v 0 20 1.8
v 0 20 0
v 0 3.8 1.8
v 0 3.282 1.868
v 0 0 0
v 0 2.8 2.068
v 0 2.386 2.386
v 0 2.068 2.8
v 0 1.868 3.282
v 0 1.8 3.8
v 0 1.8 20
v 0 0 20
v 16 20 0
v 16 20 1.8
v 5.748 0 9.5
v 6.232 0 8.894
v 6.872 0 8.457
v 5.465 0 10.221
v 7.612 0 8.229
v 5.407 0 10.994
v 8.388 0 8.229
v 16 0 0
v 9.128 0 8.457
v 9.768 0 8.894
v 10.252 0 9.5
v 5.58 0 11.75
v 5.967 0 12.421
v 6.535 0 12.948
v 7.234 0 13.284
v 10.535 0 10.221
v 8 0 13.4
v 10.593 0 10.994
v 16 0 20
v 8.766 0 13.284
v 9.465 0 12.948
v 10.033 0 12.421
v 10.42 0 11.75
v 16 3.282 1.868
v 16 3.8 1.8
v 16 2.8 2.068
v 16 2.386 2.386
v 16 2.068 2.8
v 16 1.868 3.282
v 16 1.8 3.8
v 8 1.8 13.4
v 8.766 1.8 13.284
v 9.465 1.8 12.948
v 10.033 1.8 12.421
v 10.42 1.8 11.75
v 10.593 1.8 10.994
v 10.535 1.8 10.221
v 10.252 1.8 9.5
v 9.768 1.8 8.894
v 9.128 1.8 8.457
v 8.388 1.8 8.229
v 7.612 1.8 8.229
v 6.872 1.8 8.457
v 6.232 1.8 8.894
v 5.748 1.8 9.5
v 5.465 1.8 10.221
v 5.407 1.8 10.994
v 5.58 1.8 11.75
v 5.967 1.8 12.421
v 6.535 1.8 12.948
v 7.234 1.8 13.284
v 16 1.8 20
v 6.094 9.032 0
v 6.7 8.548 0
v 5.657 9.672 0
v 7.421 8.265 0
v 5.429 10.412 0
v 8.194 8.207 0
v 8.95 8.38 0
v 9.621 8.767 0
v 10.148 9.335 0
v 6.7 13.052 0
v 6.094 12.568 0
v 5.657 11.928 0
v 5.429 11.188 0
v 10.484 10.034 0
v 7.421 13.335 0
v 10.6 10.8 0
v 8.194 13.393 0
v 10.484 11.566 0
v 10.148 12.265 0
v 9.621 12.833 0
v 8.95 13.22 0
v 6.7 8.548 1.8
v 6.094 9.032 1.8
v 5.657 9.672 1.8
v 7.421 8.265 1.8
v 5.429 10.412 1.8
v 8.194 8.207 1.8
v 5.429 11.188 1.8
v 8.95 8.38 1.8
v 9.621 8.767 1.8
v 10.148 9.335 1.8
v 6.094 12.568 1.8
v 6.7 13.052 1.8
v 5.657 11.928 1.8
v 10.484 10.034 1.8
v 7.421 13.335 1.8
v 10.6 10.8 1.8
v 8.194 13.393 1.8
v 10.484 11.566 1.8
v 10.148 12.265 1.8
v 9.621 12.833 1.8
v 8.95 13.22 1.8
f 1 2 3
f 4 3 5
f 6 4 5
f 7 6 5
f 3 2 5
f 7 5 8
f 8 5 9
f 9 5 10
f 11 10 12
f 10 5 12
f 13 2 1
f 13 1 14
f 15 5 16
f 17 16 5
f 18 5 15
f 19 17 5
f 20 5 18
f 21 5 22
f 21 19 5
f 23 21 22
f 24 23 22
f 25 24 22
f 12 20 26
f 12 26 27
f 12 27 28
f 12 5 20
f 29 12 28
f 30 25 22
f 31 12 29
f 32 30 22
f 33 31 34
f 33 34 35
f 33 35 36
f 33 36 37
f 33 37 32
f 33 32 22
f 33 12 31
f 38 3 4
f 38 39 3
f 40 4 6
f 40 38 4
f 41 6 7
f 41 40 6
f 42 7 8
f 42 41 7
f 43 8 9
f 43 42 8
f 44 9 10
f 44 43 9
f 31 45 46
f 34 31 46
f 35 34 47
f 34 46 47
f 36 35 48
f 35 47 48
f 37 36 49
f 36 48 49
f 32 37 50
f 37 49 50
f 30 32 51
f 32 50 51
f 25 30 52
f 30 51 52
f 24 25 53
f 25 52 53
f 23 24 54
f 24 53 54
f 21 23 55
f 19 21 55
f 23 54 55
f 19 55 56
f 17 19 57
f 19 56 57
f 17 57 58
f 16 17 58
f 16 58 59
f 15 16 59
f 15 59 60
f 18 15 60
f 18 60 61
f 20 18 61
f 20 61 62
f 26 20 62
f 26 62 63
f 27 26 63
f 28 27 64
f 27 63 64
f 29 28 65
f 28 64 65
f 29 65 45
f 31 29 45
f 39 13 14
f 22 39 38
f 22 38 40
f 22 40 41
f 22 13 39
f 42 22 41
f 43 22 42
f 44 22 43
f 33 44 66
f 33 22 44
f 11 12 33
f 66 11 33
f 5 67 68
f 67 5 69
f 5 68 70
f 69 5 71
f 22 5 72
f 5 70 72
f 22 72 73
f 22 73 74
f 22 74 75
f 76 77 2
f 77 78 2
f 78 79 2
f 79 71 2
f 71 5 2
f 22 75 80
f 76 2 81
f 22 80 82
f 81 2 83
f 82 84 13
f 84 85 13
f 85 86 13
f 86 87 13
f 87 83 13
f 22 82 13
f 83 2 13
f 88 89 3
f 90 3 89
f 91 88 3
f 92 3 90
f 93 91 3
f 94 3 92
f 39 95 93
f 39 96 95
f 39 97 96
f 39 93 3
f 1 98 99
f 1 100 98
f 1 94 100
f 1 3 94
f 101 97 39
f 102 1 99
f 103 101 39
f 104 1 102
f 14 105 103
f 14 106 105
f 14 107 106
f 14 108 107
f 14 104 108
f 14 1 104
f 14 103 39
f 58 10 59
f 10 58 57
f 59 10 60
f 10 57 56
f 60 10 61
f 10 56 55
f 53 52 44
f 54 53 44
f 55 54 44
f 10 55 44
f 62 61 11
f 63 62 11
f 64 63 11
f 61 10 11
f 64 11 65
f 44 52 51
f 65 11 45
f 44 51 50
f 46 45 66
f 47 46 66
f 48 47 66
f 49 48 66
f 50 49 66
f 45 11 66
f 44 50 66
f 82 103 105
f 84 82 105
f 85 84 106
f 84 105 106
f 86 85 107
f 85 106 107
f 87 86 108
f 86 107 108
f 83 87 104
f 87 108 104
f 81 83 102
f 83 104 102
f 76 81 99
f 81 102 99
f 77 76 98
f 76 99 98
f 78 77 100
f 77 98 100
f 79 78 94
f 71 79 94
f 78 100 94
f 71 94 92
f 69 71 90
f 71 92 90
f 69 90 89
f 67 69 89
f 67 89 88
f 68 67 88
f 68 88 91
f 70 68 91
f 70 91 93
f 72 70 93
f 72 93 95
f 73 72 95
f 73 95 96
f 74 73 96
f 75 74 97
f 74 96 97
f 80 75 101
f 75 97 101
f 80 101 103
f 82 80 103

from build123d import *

# Parameters (mm, degrees)
SKETCH1_W           = 16
SKETCH1_H           = 20
BOSS_EXTRUDE1_DEPTH = 1.8
SKETCH2_W           = 16
SKETCH2_H           = 18.2
BOSS_EXTRUDE2_DEPTH = 1.8
SKETCH3_R           = 2.6
CUT_EXTRUDE1_DEPTH  = 1.8
SKETCH4_R           = 2.6
CUT_EXTRUDE2_DEPTH  = 1.8
FILLET1_R           = 2


with BuildPart() as part:
    # Sketch1 → Boss-Extrude1 (new body)
    with BuildSketch(Plane.XY):
        with Locations((8, 10)):
            Rectangle(SKETCH1_W, SKETCH1_H)
    extrude(amount=BOSS_EXTRUDE1_DEPTH)

    # Sketch2 → Boss-Extrude2 (add)
    with BuildSketch(Plane.XZ):
        with Locations((8, 10.9)):
            Rectangle(SKETCH2_W, SKETCH2_H)
    extrude(amount=-BOSS_EXTRUDE2_DEPTH)

    # Sketch3 → Cut-Extrude1 (cut)
    with BuildSketch(Plane.XY.offset(1.8)):
        with Locations((8, 10.8)):
            Circle(SKETCH3_R)
    extrude(amount=-CUT_EXTRUDE1_DEPTH, mode=Mode.SUBTRACT)

    # Sketch4 → Cut-Extrude2 (cut)
    with BuildSketch(Plane(origin=(0, 1.8, 0), x_dir=(1, 0, 0), z_dir=(0, 1, 0))):
        with Locations(Location((8, -10.8, 0), (0, 0, 270))):
            Circle(SKETCH4_R)
    extrude(amount=-CUT_EXTRUDE2_DEPTH, mode=Mode.SUBTRACT)

    # Fillet1
    fillet1_edges = [part.edges().sort_by_distance(p)[0] for p in [
        (8, 1.8, 1.8),
    ]]
    fillet(fillet1_edges, radius=FILLET1_R)


solid = part.part
